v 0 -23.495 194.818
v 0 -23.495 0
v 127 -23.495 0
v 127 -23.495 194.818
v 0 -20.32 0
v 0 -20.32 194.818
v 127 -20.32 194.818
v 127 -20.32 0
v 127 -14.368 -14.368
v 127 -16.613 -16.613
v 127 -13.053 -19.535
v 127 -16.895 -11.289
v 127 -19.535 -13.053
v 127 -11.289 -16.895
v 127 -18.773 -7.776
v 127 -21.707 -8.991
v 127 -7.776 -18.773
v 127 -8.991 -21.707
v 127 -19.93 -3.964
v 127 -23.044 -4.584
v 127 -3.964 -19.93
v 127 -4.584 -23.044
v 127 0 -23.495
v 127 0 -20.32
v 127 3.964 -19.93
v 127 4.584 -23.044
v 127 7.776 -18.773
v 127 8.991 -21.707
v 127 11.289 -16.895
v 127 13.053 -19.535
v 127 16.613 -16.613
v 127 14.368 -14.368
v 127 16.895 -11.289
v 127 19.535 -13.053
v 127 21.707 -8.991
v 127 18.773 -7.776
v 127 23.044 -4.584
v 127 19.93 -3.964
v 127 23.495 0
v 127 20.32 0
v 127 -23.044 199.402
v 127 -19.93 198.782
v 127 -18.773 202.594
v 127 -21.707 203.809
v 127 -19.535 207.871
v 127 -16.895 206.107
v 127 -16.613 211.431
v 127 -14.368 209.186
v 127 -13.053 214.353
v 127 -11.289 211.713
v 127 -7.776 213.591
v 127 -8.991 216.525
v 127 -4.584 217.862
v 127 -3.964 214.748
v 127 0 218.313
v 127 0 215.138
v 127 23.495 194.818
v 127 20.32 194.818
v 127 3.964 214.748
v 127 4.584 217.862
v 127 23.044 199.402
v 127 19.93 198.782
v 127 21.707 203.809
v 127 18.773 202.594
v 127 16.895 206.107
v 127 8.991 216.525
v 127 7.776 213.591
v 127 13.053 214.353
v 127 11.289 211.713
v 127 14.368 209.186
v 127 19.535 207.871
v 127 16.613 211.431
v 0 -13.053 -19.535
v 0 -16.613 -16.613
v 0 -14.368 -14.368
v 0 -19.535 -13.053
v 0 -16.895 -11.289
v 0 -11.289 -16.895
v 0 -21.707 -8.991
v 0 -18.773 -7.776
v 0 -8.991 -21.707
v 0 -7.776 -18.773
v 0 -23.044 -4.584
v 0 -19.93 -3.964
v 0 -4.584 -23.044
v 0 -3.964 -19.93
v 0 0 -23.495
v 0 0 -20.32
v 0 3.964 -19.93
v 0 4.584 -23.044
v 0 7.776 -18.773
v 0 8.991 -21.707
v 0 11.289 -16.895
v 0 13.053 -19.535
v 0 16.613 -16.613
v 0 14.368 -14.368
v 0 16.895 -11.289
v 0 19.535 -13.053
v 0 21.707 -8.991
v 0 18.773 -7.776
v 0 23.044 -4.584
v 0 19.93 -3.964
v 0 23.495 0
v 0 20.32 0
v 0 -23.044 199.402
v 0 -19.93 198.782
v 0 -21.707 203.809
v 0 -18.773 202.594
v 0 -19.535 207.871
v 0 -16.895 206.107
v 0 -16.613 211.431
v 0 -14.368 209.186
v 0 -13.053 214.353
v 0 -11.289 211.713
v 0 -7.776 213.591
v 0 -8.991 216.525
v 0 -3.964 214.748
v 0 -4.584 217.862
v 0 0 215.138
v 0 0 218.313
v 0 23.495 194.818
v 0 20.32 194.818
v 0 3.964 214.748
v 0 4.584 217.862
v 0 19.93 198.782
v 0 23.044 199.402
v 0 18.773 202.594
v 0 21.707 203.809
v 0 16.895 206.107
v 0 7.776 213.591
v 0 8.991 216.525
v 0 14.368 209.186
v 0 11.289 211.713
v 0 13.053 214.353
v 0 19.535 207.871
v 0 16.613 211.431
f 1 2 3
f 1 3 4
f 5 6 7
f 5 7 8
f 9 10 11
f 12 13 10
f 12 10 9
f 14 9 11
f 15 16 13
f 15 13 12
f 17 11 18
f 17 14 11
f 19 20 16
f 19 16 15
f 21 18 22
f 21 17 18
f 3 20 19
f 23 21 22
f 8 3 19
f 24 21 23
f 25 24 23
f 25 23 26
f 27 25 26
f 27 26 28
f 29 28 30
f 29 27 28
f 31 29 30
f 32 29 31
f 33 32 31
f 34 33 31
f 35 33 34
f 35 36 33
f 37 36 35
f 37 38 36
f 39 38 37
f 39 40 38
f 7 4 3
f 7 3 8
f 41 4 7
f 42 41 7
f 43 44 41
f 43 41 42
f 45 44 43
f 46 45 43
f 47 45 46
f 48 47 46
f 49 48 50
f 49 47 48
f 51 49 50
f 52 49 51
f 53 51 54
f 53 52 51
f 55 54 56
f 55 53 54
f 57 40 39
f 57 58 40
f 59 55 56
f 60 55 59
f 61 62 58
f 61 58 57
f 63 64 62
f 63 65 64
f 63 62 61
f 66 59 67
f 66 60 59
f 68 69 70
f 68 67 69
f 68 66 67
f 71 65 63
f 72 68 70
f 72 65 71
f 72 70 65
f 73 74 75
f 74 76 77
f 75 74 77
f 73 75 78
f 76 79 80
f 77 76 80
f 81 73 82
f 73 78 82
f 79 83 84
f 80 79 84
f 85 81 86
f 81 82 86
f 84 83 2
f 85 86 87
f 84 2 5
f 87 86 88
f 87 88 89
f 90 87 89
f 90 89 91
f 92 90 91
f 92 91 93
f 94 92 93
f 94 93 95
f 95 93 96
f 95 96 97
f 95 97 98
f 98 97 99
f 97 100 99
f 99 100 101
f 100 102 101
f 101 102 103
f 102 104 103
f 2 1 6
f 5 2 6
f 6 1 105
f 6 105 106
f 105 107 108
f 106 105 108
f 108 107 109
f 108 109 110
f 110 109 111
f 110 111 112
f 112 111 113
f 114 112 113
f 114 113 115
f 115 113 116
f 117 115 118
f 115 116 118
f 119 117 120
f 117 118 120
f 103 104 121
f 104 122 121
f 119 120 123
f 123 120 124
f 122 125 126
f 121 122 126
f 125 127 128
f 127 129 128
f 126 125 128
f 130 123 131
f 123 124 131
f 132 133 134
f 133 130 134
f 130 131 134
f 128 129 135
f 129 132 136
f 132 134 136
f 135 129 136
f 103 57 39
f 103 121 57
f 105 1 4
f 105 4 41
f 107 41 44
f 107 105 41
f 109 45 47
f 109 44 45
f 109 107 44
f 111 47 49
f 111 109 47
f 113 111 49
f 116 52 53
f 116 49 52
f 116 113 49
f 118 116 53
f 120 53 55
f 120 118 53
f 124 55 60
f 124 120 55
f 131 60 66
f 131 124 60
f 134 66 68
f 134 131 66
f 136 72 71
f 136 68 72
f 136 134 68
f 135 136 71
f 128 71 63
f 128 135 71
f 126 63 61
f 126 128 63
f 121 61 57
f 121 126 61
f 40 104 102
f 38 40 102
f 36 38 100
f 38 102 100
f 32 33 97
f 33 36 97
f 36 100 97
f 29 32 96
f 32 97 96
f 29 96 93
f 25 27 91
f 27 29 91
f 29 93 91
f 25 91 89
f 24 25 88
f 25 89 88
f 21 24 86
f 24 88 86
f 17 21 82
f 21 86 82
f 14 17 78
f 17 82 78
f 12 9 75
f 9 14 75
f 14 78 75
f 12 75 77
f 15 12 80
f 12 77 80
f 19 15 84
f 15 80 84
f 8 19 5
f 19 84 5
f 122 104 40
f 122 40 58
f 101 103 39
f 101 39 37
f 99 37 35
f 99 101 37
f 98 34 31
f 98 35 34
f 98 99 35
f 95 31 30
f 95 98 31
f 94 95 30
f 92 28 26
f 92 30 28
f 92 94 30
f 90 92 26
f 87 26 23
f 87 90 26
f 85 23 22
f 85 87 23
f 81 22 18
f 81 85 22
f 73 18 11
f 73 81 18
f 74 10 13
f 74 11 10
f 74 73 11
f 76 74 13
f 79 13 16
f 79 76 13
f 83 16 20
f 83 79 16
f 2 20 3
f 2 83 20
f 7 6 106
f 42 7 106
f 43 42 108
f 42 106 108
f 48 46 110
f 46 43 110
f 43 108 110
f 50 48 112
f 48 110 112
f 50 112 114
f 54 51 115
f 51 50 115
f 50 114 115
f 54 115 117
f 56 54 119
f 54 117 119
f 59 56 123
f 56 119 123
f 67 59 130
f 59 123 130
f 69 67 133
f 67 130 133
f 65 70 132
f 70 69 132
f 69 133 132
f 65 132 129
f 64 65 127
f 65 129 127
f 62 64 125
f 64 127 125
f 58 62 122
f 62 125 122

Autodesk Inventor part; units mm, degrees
ref_plane "YZ Plane" through (0, 0, 0) normal (1, 0, 0) x (0, 1, 0)
ref_plane "XZ Plane" through (0, 0, 0) normal (0, 1, 0) x (-1, 0, 0)
ref_plane "XY Plane" through (0, 0, 0) normal (0, 0, 1) x (1, 0, 0)
sketch "Sketch1" plane through (0, 0, 0) normal (1, 0, 0) x (0, 1, 0)
  line L0 (0, 0) -> (0, 194.818) construction
  line L1 (20.32, 0) -> (20.32, 194.818)
  line L2 (-20.32, 194.818) -> (-20.32, 0)
  arc A0 (-20.32, 0) -> (20.32, 0) centre (0, 0) ccw
  arc A1 (20.32, 194.818) -> (-20.32, 194.818) centre (0, 194.818) ccw
  line L3 (23.495, 194.818) -> (23.495, 0)
  arc A2 (-23.495, 0) -> (23.495, 0) centre (0, 0) ccw
  line L4 (-23.495, 0) -> (-23.495, 194.818)
  arc A3 (23.495, 194.818) -> (-23.495, 194.818) centre (0, 194.818) ccw
  point P0 (0, 97.409)
  dimension "d0" = 194.818
  dimension "d1" = 40.64
  dimension "d2" = 3.175
extrude "Extrusion1" add sketch "Sketch1" along normal blind 127
properties part number "Shooting_Belt"
